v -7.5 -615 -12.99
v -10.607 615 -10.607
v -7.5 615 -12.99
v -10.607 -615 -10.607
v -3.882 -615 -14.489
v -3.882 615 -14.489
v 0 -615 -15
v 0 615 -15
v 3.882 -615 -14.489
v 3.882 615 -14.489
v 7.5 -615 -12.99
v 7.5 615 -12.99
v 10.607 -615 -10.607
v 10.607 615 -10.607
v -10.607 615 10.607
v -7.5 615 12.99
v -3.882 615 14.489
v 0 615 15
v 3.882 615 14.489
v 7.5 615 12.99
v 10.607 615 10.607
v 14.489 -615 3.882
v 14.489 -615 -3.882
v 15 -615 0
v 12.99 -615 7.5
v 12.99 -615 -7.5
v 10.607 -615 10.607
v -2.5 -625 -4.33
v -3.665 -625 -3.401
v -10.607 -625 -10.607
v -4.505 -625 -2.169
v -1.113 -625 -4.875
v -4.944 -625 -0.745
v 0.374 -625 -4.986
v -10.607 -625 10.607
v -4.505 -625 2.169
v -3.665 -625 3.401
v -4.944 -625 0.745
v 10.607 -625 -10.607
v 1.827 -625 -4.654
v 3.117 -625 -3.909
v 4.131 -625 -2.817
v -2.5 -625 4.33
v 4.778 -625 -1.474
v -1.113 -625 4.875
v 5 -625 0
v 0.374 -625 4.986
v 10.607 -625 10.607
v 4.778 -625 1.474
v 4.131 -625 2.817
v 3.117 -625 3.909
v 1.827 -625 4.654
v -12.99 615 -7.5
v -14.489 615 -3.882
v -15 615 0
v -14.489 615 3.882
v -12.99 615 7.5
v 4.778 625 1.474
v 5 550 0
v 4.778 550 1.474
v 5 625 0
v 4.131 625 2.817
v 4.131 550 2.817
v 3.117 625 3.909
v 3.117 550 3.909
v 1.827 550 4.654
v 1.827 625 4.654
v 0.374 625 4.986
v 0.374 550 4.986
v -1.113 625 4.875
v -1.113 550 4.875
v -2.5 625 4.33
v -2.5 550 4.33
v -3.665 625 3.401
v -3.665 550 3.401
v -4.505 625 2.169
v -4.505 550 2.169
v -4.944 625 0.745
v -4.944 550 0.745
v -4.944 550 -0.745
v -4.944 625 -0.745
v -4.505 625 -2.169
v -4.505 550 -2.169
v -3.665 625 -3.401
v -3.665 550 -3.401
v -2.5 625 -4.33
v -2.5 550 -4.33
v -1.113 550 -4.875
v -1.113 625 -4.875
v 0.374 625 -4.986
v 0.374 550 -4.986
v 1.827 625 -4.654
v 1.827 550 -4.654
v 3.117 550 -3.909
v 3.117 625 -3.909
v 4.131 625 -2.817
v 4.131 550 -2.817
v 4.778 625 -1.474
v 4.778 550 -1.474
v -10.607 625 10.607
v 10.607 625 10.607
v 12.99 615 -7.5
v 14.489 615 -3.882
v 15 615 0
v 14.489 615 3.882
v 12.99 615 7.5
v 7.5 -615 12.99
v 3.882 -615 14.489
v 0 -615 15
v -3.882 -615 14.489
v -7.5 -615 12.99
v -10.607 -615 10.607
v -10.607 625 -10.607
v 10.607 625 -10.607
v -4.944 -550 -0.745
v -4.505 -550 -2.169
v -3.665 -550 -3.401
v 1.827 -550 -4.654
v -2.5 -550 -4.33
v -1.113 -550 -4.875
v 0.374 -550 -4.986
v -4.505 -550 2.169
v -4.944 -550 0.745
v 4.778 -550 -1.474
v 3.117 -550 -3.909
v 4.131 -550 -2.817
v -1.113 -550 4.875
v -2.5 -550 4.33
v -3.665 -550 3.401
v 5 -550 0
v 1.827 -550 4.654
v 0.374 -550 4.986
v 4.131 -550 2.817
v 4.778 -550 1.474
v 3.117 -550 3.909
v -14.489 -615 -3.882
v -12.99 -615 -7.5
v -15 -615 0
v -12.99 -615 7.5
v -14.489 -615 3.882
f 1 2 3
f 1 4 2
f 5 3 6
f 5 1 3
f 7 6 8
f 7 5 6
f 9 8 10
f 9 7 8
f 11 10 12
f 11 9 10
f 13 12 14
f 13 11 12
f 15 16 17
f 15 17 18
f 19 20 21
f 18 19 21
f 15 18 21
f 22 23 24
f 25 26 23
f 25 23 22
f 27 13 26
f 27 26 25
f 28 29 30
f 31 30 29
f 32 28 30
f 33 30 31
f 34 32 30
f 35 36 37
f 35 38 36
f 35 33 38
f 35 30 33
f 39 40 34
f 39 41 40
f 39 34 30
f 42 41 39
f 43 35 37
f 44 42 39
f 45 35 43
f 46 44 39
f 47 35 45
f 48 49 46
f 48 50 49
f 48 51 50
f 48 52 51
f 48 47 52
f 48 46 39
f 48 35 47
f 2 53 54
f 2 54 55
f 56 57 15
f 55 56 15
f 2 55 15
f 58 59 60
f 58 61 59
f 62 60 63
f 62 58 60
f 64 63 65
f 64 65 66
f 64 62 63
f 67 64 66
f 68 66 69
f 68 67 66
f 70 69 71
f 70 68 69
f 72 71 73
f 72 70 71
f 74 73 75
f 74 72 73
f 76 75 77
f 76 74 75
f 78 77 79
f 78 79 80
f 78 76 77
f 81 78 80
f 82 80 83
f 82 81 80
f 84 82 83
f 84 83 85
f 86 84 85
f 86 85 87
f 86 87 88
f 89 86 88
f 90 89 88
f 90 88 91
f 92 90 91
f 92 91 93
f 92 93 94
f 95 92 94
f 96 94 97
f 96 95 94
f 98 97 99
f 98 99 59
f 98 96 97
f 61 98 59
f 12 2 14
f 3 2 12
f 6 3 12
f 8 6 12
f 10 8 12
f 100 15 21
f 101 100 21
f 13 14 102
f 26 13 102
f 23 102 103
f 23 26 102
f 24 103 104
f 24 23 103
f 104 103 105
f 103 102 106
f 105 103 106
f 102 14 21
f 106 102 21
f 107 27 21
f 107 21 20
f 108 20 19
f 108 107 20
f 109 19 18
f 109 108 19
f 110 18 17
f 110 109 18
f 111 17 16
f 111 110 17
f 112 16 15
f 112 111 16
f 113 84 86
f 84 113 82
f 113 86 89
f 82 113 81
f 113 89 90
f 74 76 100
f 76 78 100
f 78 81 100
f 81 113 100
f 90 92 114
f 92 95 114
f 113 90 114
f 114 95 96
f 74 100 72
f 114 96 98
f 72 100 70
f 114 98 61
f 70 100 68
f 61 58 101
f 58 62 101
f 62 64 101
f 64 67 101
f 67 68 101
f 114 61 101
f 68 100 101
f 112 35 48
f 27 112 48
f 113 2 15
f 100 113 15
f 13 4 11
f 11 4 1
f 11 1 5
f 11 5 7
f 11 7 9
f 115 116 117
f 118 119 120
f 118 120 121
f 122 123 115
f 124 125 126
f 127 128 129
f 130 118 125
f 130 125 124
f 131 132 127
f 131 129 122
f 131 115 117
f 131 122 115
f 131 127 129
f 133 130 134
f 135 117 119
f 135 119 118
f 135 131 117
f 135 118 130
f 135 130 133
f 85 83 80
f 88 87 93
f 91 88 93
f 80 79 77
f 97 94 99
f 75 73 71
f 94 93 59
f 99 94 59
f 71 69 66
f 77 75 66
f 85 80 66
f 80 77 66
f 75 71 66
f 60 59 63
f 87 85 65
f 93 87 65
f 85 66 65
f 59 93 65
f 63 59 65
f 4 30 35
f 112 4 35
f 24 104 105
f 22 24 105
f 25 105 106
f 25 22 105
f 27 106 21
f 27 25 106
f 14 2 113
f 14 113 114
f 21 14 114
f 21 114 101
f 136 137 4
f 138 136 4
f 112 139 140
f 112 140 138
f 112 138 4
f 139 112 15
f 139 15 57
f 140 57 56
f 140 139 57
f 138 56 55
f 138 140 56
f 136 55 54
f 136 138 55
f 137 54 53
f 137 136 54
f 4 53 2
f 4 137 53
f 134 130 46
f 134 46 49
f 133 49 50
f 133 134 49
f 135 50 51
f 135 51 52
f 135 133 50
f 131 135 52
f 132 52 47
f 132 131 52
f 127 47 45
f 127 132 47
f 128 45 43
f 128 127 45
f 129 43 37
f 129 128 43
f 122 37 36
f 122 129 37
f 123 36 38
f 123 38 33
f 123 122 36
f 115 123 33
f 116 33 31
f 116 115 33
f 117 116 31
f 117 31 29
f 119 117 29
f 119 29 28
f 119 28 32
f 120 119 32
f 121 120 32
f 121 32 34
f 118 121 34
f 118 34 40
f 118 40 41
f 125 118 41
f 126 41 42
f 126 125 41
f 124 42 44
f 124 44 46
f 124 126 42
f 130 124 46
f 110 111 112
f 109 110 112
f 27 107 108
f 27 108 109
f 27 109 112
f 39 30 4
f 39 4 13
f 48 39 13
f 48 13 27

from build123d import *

# Parameters (mm, degrees)
F0_W     = 21.213204
F0_H     = 21.213204
F0_R     = 5
F1_DEPTH = 625
F2_DEPTH = 615
F3_DEPTH = 550


with BuildPart() as f1:
    # F0 (on Front) → F1 (new body, symmetric)
    with BuildSketch(Plane.XZ):
        Rectangle(F0_W, F0_H)
        Circle(F0_R, mode=Mode.SUBTRACT)
    extrude(amount=F1_DEPTH, both=True)

    # F0 (on Front) → F2 (join, symmetric)
    with BuildSketch(Plane.XZ):
        with BuildLine():
            Line((-10.606602, 10.606602), (10.606602, 10.606602))
            ThreePointArc((10.606602, 10.606602), (0, 15), (-10.606602, 10.606602))
        make_face()
        with BuildLine():
            ThreePointArc((10.606602, -10.606602), (13.858193, -5.740251), (15, 0))
            ThreePointArc((15, 0), (13.858193, 5.740251), (10.606602, 10.606602))
            Line((10.606602, 10.606602), (10.606602, -10.606602))
        make_face()
        with BuildLine():
            ThreePointArc((-10.606602, -10.606602), (0, -15), (10.606602, -10.606602))
            Line((10.606602, -10.606602), (-10.606602, -10.606602))
        make_face()
        with BuildLine():
            Line((-10.606602, -10.606602), (-10.606602, 10.606602))
            ThreePointArc((-10.606602, 10.606602), (-15, 0), (-10.606602, -10.606602))
        make_face()
    extrude(amount=F2_DEPTH, both=True)

    # F0 (on Front) → F3 (join, symmetric)
    with BuildSketch(Plane.XZ):
        Circle(F0_R)
    extrude(amount=F3_DEPTH, both=True)


solid = f1.part
